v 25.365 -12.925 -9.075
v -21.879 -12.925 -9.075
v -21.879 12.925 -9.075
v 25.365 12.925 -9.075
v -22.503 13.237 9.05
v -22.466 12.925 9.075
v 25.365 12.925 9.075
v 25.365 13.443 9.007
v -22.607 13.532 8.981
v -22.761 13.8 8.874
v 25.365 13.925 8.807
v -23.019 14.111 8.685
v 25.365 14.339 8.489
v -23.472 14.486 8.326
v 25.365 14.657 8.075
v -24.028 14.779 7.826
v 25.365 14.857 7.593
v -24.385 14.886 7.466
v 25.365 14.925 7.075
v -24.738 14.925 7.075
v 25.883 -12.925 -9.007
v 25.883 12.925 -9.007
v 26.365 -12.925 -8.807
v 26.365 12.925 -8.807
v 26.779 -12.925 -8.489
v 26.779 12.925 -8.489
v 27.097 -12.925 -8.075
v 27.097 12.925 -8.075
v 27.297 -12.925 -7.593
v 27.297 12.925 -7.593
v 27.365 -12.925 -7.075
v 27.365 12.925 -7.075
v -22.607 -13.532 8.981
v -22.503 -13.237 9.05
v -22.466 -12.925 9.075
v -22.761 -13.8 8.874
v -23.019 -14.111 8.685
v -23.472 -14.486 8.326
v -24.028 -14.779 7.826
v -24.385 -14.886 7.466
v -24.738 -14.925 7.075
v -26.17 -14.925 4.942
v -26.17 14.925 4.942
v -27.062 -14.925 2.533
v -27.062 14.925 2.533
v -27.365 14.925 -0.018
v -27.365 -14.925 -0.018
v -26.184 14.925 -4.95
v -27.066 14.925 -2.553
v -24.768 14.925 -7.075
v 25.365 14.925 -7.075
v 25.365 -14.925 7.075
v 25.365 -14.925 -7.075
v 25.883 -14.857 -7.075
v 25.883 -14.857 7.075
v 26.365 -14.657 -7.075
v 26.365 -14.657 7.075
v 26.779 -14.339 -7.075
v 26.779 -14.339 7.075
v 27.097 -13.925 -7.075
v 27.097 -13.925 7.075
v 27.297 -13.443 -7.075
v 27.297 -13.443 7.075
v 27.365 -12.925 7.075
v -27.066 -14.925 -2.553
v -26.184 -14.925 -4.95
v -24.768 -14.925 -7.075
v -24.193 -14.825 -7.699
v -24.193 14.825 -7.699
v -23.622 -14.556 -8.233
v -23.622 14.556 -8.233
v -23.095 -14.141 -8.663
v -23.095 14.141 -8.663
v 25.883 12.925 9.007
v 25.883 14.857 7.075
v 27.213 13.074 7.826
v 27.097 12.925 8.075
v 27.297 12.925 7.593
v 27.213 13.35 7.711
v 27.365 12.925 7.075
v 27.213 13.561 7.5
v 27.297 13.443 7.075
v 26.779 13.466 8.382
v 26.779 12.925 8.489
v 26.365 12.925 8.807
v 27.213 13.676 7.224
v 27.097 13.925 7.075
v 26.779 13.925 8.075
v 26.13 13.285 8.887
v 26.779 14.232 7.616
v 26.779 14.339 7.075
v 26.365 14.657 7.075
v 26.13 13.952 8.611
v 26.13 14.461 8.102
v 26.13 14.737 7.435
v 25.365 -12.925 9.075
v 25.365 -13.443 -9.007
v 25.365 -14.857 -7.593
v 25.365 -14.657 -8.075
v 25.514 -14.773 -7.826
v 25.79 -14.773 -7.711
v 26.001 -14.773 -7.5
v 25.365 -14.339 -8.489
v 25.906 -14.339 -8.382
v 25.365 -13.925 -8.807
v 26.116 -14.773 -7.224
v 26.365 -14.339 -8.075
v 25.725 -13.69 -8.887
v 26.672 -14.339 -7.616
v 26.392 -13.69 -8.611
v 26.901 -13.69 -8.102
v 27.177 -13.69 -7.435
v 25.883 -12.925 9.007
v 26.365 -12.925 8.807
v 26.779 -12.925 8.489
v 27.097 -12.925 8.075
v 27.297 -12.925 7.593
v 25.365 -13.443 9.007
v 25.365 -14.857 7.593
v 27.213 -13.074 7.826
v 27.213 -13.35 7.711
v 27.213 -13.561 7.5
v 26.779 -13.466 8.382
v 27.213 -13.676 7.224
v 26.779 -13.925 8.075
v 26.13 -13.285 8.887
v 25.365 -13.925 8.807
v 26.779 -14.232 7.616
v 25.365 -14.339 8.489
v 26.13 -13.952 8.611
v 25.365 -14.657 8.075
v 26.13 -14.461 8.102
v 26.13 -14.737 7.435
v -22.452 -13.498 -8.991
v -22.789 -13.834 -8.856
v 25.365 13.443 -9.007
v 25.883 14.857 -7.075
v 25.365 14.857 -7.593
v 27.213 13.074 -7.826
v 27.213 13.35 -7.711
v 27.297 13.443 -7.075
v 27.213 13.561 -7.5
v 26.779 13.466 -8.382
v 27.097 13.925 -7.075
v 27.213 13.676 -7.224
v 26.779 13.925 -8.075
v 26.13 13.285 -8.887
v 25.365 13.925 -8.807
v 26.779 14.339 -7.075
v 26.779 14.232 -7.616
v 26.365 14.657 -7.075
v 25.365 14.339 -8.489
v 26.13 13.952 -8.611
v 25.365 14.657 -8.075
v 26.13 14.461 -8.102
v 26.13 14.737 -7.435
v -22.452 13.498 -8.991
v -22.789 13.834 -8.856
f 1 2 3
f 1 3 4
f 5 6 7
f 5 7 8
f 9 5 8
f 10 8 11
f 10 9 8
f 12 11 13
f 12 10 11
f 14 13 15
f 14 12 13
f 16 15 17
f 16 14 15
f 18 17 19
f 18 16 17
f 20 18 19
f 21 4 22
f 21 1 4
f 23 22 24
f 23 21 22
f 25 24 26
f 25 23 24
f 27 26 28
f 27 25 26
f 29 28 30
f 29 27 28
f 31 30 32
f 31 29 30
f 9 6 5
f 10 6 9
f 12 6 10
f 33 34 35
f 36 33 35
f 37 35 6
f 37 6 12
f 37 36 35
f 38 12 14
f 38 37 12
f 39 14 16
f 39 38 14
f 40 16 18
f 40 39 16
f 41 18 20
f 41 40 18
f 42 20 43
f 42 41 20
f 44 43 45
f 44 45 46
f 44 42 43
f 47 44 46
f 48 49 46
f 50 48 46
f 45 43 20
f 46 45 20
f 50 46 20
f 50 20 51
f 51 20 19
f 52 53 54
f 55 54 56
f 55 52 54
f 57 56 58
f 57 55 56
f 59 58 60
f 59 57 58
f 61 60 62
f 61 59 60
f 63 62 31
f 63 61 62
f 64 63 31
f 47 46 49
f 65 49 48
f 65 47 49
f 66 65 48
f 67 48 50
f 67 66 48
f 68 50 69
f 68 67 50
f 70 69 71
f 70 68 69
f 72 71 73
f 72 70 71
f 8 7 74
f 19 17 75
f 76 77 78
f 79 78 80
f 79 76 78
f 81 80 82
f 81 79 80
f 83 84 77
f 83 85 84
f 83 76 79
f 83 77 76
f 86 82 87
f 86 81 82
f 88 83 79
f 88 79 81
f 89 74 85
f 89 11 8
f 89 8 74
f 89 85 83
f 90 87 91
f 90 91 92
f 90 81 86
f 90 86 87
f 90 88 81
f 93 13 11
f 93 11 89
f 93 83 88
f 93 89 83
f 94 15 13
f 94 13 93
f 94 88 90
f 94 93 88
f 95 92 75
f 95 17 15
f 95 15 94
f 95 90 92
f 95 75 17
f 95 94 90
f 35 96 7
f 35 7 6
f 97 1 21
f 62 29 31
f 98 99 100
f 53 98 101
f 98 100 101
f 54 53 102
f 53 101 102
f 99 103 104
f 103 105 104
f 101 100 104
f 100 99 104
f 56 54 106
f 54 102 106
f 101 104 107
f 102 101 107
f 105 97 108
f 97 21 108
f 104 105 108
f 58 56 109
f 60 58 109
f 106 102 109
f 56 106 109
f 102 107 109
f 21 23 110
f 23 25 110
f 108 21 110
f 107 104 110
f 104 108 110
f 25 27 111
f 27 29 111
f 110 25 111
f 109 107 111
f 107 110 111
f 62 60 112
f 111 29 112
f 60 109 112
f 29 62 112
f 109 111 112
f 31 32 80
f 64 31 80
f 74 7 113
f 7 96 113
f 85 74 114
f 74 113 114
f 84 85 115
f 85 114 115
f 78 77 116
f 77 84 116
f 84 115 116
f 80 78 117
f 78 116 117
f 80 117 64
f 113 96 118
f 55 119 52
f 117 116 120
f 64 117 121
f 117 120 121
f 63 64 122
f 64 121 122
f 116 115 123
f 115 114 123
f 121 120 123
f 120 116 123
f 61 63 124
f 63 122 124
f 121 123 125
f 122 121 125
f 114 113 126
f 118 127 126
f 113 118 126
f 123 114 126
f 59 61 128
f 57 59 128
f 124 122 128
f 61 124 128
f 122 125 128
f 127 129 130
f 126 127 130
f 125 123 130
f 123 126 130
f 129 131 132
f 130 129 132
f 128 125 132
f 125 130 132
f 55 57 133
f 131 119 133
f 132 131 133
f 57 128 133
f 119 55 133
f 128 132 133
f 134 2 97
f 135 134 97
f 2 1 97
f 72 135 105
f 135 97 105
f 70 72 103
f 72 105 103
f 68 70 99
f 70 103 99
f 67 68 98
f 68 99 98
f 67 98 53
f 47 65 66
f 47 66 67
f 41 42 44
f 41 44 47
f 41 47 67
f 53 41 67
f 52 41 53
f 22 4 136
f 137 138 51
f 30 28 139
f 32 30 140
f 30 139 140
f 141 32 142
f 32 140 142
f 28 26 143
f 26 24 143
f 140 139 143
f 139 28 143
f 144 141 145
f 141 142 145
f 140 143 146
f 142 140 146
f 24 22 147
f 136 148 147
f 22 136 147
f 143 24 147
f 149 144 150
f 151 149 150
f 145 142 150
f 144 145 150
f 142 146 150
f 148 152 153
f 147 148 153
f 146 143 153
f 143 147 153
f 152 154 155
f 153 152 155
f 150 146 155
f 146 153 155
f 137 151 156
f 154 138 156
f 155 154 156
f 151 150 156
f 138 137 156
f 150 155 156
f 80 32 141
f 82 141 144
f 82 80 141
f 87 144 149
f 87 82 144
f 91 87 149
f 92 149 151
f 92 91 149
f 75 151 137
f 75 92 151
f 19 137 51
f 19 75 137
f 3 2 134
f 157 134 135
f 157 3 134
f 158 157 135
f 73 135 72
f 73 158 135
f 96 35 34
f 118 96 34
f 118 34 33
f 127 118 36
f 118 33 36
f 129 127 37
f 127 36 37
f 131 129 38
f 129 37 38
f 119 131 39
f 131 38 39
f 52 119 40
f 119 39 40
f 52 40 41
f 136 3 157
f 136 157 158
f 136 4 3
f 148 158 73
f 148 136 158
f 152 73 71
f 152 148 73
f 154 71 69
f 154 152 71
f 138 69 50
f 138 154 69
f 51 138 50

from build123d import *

# Parameters (mm, degrees)
F1_DEPTH = 14.925
F2_R     = 2


with BuildPart() as f1:
    # F0 (on Front) → F1 (new body, symmetric)
    with BuildSketch(Plane.XZ):
        with BuildLine():
            Line((-22.5191842765, -9.075), (27.365, -9.075))
            Line((27.365, -9.075), (27.365, 9.075))
            Line((27.365, 9.075), (-22.4661100656, 9.075))
            ThreePointArc((-22.4661100656, 9.075), (-26.0623595245, 5.1465764849), (-27.3650142087, -0.0175896876))
            ThreePointArc((-27.3650142087, -0.0175896876), (-26.0774195294, -5.1537056642), (-22.5191842765, -9.075))
        make_face()
    extrude(amount=F1_DEPTH, both=True)

    # F2
    f2_edges = [f1.edges().sort_by_distance(p)[0] for p in [
        (2.449445, -14.925, 9.075),
        (2.449445, 14.925, 9.075),
        (27.365, 7.4625, 9.075),
        (27.365, -7.4625, 9.075),
        (-22.519184, 7.4625, -9.075),
        (2.422908, 14.925, -9.075),
        (27.365, 7.4625, -9.075),
        (27.365, -7.4625, -9.075),
        (2.422908, -14.925, -9.075),
        (-22.519184, -7.4625, -9.075),
        (27.365, -14.925, 0),
        (27.365, 14.925, 0),
    ]]
    fillet(f2_edges, radius=F2_R)


solid = f1.part
